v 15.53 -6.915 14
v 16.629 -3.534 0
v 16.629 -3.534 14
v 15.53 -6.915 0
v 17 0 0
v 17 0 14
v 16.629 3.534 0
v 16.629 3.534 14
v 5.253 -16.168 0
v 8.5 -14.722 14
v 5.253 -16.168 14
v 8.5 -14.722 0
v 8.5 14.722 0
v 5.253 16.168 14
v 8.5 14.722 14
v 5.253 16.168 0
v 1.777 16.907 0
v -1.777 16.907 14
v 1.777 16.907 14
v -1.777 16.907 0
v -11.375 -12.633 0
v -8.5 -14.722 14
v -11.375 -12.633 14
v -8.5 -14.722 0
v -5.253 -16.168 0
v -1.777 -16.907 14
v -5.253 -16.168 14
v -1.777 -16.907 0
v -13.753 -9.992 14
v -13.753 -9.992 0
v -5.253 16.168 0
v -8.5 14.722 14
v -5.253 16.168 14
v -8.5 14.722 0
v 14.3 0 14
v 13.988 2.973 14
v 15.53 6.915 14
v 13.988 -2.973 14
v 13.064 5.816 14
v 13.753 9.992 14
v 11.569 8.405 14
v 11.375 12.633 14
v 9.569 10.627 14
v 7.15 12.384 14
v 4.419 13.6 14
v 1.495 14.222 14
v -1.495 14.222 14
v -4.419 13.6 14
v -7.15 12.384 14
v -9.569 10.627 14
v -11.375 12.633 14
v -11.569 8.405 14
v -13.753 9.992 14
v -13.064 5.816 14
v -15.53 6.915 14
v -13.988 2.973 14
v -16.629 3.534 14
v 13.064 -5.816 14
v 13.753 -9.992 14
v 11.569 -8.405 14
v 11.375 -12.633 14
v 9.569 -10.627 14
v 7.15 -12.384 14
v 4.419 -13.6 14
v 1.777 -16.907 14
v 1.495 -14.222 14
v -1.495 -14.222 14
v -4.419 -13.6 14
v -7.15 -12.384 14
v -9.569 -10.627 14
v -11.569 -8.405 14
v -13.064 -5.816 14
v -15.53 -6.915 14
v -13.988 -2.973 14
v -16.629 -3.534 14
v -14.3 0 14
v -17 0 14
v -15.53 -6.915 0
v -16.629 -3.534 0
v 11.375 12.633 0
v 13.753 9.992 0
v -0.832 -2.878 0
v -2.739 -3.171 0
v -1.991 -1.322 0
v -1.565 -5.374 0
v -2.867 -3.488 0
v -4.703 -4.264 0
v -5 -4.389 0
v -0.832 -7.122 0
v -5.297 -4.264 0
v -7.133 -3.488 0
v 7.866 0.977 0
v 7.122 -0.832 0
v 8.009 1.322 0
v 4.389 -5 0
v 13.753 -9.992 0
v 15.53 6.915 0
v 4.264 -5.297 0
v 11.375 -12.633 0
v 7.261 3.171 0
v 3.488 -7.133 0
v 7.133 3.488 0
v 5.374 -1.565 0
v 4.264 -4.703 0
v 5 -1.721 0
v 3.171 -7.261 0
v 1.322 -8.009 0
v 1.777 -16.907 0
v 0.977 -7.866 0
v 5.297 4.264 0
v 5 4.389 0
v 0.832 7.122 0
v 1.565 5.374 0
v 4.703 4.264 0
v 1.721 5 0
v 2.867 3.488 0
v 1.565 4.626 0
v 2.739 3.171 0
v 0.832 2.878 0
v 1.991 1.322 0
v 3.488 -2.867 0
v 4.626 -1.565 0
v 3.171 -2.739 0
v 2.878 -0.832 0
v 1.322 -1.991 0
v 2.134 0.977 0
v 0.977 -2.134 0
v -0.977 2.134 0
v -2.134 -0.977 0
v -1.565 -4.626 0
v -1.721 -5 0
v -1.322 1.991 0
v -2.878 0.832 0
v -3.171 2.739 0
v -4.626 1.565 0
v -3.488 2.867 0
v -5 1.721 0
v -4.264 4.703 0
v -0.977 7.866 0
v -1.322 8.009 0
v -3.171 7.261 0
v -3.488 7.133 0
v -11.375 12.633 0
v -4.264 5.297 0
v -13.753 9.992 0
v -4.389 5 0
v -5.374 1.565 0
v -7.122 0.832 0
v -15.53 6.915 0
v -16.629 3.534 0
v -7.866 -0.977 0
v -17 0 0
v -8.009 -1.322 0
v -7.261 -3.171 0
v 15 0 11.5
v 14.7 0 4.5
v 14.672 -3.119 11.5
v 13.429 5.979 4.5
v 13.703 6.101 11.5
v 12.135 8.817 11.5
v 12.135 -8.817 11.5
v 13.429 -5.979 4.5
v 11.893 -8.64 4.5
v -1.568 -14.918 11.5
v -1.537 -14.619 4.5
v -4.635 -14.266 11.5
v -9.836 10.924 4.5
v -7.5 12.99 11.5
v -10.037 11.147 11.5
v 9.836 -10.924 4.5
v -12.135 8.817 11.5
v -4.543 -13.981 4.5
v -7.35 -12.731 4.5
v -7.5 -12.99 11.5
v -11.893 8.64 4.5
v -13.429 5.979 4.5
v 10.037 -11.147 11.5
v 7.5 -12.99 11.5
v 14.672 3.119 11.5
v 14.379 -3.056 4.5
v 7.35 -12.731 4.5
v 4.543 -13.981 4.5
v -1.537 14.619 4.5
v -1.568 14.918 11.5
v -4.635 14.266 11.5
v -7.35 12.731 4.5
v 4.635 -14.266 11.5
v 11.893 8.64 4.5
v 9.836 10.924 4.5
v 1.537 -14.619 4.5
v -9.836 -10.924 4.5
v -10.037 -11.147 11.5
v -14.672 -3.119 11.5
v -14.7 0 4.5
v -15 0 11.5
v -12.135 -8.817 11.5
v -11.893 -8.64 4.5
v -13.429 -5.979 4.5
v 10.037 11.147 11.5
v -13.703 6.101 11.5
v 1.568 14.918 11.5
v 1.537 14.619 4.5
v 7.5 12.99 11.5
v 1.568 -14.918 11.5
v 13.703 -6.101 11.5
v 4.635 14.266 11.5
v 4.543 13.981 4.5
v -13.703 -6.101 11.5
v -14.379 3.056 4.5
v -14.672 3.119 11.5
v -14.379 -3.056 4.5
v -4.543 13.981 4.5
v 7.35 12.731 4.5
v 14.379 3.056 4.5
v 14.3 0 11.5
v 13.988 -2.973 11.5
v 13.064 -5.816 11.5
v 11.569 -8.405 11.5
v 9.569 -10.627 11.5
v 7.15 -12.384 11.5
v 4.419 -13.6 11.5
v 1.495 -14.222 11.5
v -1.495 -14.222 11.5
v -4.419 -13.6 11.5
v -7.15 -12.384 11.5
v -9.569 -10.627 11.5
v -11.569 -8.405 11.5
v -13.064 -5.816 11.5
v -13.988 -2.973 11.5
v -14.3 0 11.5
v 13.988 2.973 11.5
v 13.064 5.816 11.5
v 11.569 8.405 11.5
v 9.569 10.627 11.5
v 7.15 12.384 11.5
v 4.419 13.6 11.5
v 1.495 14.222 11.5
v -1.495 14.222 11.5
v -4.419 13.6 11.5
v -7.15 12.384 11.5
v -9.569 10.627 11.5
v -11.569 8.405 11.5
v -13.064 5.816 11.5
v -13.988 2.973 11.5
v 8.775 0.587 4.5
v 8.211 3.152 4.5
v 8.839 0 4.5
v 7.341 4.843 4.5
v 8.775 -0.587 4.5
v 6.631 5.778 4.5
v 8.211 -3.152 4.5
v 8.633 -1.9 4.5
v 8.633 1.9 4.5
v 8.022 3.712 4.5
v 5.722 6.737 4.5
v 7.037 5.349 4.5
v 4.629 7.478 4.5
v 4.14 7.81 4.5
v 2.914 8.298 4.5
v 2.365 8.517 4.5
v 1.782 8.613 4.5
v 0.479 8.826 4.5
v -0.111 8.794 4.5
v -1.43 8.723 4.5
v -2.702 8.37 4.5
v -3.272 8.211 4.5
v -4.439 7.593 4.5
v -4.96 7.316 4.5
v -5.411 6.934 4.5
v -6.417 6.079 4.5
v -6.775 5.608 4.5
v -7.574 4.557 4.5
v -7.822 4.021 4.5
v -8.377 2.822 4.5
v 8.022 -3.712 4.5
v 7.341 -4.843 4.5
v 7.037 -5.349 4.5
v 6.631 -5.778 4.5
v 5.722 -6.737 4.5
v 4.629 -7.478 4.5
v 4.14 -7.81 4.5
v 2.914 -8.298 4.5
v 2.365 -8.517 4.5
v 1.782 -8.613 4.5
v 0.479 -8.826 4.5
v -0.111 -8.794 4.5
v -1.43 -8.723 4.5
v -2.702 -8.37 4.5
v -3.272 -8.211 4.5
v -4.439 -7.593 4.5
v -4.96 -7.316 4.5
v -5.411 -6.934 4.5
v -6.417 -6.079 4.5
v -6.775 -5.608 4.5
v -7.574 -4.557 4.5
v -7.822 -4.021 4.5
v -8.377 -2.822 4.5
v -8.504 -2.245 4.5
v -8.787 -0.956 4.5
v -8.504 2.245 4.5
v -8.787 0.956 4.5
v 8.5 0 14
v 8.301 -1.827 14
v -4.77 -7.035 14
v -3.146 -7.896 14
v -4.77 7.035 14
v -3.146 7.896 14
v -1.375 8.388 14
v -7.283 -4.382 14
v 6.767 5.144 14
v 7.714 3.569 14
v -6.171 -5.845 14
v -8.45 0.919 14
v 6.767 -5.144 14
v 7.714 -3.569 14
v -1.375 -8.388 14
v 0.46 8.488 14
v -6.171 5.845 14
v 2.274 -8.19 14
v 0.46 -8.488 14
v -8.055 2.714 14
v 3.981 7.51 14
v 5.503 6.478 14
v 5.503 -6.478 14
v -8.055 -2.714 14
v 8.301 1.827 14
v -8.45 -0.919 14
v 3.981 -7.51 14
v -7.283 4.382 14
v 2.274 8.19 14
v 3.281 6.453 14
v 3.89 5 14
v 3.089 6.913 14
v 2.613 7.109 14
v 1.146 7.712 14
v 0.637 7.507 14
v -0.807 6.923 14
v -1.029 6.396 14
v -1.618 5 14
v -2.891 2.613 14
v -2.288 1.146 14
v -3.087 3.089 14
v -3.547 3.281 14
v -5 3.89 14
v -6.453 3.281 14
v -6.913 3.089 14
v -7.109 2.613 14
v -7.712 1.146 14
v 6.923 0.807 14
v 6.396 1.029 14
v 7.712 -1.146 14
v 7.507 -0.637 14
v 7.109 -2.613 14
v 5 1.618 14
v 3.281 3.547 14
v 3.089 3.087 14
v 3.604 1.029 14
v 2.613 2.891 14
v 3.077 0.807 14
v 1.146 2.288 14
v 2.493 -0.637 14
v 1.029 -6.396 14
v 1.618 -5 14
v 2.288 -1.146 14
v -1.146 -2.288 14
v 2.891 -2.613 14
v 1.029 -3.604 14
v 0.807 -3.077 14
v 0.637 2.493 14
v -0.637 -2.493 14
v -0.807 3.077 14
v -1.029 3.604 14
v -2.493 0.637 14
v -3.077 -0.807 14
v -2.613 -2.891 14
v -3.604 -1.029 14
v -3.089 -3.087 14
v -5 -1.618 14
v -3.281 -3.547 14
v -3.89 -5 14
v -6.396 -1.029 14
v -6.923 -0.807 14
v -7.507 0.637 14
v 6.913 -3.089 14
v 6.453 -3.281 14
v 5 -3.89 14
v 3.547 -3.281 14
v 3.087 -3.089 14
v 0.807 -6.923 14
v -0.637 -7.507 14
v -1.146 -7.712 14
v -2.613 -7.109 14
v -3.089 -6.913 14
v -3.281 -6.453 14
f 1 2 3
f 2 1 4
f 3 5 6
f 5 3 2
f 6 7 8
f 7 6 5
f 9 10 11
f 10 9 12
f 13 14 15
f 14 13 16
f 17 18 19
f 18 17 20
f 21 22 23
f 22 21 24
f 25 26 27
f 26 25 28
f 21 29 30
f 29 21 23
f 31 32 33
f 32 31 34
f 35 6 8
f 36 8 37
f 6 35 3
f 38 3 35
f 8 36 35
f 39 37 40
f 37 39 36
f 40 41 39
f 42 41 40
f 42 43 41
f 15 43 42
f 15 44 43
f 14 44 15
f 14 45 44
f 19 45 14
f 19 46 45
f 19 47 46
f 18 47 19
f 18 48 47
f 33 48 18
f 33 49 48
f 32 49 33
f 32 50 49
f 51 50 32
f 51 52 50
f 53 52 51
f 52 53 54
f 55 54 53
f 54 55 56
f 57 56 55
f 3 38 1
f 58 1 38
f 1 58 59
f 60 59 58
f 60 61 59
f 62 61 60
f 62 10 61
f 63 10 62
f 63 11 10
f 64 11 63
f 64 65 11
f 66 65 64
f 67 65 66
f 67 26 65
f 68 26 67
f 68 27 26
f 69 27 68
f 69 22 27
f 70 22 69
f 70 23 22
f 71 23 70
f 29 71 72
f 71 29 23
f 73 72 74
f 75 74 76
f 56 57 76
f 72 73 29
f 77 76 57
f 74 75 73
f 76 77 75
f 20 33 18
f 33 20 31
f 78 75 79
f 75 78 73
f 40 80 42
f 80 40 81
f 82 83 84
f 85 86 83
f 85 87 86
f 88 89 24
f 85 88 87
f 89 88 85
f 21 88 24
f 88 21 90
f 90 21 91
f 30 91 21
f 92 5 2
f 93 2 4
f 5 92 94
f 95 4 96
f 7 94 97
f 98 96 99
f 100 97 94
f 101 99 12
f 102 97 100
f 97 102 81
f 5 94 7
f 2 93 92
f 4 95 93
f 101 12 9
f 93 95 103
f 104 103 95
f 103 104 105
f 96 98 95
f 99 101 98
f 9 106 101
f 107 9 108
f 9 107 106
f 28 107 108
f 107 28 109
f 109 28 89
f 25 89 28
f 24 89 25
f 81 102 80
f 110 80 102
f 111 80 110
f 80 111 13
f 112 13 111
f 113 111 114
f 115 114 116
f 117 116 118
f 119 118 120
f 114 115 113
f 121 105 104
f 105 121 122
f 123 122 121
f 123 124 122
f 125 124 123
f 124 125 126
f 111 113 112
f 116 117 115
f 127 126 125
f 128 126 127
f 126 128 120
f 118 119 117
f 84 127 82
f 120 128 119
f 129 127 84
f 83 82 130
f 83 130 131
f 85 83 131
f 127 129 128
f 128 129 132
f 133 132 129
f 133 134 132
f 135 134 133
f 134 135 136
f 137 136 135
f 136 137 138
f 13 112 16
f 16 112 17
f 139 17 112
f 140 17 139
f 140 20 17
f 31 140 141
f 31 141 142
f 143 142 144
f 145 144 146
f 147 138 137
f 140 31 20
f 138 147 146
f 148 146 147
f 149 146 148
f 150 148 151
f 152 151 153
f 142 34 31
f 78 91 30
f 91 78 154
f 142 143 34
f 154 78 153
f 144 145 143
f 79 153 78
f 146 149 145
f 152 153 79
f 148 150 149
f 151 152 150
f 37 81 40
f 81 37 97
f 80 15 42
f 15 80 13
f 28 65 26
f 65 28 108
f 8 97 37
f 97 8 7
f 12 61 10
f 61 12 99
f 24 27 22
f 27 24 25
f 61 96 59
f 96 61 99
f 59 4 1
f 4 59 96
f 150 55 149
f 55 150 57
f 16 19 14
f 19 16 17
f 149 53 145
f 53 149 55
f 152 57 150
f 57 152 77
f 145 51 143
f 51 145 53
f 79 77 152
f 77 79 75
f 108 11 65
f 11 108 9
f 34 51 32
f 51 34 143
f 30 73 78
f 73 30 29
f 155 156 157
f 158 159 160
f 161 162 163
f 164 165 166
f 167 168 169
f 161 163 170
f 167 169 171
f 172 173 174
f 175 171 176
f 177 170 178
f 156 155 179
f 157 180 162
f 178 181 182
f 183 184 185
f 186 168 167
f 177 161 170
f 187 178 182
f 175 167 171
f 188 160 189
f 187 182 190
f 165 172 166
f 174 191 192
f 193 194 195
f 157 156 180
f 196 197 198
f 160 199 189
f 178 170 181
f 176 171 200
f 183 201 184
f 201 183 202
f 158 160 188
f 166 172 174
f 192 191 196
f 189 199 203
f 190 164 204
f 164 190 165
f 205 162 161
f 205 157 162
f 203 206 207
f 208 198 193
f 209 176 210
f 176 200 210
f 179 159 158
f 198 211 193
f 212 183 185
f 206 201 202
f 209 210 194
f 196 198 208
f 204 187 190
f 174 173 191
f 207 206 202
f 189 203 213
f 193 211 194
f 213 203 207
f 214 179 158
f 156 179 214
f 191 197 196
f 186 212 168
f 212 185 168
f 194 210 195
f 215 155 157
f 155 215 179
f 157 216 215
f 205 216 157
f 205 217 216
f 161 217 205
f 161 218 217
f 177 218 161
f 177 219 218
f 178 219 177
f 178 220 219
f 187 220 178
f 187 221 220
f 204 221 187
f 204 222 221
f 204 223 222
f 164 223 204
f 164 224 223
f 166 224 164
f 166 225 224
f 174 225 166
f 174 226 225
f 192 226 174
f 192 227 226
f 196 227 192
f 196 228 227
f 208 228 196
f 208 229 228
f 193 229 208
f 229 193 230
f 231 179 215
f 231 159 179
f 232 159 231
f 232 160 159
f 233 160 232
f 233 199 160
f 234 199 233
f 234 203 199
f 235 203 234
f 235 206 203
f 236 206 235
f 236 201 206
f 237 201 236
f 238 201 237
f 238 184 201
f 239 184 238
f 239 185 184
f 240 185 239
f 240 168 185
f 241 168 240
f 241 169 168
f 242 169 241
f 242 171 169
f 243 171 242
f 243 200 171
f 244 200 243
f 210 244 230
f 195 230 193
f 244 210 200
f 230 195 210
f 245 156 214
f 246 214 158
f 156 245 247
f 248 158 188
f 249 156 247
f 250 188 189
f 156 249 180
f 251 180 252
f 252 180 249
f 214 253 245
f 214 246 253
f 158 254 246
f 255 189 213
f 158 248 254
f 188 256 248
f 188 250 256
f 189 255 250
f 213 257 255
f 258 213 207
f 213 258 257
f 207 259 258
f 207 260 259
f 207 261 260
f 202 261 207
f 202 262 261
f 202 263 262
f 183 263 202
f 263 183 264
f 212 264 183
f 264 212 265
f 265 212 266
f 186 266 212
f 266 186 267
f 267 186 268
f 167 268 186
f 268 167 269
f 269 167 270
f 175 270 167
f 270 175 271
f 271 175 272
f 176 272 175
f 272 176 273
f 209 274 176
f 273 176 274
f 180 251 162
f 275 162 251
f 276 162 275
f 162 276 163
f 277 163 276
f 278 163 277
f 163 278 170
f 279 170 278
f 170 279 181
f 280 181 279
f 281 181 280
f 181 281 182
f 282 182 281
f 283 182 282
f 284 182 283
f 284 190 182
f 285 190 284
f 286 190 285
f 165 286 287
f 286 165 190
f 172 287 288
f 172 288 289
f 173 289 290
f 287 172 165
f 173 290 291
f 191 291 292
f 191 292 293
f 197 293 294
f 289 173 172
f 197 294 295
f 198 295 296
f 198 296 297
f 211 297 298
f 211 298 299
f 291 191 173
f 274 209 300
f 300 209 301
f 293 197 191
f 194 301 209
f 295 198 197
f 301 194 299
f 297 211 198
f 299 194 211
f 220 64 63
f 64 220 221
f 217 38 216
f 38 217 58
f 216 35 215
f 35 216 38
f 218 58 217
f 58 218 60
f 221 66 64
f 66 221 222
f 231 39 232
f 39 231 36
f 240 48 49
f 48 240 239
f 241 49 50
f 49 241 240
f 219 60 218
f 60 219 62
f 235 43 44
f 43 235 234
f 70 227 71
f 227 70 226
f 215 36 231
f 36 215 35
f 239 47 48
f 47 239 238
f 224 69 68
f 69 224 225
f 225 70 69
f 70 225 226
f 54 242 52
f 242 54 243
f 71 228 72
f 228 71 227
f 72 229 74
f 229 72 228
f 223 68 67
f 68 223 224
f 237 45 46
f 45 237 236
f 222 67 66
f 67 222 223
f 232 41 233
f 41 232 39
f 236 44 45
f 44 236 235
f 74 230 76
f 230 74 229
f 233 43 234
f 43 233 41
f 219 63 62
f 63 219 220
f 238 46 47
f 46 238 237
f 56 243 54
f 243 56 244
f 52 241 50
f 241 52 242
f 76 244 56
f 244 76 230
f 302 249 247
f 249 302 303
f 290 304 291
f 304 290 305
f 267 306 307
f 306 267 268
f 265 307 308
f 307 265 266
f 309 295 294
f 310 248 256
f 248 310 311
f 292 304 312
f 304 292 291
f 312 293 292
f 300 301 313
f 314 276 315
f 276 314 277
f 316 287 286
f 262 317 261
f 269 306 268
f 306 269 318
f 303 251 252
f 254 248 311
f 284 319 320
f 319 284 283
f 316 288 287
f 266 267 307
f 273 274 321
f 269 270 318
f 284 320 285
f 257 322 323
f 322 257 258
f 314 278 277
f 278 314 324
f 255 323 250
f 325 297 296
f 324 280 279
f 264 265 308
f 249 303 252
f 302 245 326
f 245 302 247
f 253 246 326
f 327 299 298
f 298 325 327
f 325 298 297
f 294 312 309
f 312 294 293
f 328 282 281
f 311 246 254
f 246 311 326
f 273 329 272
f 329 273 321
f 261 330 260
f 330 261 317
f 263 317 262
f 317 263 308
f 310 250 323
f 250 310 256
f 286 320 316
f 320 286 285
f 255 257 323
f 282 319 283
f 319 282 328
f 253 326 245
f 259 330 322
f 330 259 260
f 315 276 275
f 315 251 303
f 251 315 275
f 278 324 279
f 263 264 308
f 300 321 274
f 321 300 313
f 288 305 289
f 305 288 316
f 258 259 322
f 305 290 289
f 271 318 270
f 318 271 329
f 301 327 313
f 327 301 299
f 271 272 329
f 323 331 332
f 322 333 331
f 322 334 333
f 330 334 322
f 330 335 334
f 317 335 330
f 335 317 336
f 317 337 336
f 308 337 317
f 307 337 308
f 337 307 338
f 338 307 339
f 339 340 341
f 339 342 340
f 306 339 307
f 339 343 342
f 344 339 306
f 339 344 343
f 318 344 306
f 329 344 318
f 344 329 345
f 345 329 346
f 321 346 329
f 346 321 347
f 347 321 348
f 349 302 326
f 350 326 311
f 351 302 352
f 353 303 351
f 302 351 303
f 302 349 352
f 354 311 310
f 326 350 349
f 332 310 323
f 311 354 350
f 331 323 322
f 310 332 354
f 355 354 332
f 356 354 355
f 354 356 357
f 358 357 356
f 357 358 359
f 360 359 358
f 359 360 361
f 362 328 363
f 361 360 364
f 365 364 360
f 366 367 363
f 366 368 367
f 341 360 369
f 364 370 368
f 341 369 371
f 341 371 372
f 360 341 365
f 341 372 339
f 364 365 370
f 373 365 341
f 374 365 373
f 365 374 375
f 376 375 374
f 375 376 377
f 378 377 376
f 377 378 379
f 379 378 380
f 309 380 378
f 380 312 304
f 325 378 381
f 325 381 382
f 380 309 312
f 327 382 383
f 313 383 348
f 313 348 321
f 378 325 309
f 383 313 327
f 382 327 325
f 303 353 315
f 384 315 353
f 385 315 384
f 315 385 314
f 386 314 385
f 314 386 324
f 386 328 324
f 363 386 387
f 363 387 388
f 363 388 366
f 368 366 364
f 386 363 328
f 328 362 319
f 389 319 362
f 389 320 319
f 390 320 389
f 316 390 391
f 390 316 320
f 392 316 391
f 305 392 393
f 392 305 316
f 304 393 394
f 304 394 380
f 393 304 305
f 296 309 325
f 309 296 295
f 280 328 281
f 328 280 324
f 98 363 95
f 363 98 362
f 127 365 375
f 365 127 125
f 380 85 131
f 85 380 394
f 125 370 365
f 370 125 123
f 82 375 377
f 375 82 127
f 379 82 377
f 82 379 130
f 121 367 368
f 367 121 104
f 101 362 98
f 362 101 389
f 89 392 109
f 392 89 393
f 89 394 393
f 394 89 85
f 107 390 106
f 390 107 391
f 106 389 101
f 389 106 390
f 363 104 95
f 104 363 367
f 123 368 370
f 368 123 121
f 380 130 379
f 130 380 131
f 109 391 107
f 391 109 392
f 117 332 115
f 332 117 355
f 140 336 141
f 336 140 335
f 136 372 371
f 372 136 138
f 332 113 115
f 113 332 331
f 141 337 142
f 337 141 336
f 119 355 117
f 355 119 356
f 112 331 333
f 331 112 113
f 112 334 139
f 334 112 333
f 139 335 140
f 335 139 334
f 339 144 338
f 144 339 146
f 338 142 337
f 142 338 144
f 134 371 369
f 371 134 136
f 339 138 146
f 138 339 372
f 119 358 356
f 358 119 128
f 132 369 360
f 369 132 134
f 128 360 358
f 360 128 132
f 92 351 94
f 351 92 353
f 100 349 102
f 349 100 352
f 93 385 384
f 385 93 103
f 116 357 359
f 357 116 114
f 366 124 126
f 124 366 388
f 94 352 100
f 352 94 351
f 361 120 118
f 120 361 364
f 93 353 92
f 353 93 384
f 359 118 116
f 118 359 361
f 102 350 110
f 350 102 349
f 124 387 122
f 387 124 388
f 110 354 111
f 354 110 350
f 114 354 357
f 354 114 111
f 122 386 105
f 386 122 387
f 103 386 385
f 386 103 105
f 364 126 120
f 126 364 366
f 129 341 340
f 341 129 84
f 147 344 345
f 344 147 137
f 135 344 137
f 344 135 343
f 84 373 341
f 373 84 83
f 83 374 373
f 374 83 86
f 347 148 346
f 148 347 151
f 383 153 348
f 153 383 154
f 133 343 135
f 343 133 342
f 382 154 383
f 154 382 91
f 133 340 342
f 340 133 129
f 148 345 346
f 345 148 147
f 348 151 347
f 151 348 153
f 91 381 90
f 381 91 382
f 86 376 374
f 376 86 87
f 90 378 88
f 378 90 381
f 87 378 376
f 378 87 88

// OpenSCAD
up = 1;
down = 0;

function optimal_facets(rad) = 2*round(round(3+2*rad)/2);

module stopper(outer, inner, thickness) {
  off = 5;
  trad = 2.6;
  difference() {
    union() {
      difference() {
        cylinder(r=outer,h=thickness,center=true); // CAP
        translate([0,0,-1])
         cylinder(r2=inner+2.2,r1=inner+2.5, h=thickness/2,center=true);
        translate([0,0,-5.5])
         cylinder(r2=inner+1.8,r1=inner+1.8, h=thickness/4,center=true);
      }
      cylinder(r2=inner-3.5,r1=inner-4,h=thickness,center=true); // Stopper
    }
    translate([0,off,-0.5])
        rotate([0,10,0])
        cone(trad,0.5,down,thickness+10);
    translate([0,-off,-0.5])
        rotate([0,-10,0])
         cone(trad,0.5,down,thickness+10);
    translate([off,0,-0.5])
        rotate([10,0,0])
         cone(trad,0.5,down,thickness+10);
    translate([-off,0,-0.5])
        rotate([-10,0,0])
         cone(trad,0.5,down,thickness+10);

  } // Subtract tubes from cap+stopper

}

module cone(radius,delta,updown,len) {
   rad1 = radius;
   rad2 = radius + delta;
   facets = optimal_facets(radius);
   if (updown == 1)
	  cylinder(r1=rad2,r2=rad1,h=len,center=true,$fn=facets);
   else
     cylinder(r2=rad2,r1=rad1,h=len,center=true,$fn=facets);
}

translate([0,0,7]) rotate([180,0,0]) stopper(17,12.5,14);
